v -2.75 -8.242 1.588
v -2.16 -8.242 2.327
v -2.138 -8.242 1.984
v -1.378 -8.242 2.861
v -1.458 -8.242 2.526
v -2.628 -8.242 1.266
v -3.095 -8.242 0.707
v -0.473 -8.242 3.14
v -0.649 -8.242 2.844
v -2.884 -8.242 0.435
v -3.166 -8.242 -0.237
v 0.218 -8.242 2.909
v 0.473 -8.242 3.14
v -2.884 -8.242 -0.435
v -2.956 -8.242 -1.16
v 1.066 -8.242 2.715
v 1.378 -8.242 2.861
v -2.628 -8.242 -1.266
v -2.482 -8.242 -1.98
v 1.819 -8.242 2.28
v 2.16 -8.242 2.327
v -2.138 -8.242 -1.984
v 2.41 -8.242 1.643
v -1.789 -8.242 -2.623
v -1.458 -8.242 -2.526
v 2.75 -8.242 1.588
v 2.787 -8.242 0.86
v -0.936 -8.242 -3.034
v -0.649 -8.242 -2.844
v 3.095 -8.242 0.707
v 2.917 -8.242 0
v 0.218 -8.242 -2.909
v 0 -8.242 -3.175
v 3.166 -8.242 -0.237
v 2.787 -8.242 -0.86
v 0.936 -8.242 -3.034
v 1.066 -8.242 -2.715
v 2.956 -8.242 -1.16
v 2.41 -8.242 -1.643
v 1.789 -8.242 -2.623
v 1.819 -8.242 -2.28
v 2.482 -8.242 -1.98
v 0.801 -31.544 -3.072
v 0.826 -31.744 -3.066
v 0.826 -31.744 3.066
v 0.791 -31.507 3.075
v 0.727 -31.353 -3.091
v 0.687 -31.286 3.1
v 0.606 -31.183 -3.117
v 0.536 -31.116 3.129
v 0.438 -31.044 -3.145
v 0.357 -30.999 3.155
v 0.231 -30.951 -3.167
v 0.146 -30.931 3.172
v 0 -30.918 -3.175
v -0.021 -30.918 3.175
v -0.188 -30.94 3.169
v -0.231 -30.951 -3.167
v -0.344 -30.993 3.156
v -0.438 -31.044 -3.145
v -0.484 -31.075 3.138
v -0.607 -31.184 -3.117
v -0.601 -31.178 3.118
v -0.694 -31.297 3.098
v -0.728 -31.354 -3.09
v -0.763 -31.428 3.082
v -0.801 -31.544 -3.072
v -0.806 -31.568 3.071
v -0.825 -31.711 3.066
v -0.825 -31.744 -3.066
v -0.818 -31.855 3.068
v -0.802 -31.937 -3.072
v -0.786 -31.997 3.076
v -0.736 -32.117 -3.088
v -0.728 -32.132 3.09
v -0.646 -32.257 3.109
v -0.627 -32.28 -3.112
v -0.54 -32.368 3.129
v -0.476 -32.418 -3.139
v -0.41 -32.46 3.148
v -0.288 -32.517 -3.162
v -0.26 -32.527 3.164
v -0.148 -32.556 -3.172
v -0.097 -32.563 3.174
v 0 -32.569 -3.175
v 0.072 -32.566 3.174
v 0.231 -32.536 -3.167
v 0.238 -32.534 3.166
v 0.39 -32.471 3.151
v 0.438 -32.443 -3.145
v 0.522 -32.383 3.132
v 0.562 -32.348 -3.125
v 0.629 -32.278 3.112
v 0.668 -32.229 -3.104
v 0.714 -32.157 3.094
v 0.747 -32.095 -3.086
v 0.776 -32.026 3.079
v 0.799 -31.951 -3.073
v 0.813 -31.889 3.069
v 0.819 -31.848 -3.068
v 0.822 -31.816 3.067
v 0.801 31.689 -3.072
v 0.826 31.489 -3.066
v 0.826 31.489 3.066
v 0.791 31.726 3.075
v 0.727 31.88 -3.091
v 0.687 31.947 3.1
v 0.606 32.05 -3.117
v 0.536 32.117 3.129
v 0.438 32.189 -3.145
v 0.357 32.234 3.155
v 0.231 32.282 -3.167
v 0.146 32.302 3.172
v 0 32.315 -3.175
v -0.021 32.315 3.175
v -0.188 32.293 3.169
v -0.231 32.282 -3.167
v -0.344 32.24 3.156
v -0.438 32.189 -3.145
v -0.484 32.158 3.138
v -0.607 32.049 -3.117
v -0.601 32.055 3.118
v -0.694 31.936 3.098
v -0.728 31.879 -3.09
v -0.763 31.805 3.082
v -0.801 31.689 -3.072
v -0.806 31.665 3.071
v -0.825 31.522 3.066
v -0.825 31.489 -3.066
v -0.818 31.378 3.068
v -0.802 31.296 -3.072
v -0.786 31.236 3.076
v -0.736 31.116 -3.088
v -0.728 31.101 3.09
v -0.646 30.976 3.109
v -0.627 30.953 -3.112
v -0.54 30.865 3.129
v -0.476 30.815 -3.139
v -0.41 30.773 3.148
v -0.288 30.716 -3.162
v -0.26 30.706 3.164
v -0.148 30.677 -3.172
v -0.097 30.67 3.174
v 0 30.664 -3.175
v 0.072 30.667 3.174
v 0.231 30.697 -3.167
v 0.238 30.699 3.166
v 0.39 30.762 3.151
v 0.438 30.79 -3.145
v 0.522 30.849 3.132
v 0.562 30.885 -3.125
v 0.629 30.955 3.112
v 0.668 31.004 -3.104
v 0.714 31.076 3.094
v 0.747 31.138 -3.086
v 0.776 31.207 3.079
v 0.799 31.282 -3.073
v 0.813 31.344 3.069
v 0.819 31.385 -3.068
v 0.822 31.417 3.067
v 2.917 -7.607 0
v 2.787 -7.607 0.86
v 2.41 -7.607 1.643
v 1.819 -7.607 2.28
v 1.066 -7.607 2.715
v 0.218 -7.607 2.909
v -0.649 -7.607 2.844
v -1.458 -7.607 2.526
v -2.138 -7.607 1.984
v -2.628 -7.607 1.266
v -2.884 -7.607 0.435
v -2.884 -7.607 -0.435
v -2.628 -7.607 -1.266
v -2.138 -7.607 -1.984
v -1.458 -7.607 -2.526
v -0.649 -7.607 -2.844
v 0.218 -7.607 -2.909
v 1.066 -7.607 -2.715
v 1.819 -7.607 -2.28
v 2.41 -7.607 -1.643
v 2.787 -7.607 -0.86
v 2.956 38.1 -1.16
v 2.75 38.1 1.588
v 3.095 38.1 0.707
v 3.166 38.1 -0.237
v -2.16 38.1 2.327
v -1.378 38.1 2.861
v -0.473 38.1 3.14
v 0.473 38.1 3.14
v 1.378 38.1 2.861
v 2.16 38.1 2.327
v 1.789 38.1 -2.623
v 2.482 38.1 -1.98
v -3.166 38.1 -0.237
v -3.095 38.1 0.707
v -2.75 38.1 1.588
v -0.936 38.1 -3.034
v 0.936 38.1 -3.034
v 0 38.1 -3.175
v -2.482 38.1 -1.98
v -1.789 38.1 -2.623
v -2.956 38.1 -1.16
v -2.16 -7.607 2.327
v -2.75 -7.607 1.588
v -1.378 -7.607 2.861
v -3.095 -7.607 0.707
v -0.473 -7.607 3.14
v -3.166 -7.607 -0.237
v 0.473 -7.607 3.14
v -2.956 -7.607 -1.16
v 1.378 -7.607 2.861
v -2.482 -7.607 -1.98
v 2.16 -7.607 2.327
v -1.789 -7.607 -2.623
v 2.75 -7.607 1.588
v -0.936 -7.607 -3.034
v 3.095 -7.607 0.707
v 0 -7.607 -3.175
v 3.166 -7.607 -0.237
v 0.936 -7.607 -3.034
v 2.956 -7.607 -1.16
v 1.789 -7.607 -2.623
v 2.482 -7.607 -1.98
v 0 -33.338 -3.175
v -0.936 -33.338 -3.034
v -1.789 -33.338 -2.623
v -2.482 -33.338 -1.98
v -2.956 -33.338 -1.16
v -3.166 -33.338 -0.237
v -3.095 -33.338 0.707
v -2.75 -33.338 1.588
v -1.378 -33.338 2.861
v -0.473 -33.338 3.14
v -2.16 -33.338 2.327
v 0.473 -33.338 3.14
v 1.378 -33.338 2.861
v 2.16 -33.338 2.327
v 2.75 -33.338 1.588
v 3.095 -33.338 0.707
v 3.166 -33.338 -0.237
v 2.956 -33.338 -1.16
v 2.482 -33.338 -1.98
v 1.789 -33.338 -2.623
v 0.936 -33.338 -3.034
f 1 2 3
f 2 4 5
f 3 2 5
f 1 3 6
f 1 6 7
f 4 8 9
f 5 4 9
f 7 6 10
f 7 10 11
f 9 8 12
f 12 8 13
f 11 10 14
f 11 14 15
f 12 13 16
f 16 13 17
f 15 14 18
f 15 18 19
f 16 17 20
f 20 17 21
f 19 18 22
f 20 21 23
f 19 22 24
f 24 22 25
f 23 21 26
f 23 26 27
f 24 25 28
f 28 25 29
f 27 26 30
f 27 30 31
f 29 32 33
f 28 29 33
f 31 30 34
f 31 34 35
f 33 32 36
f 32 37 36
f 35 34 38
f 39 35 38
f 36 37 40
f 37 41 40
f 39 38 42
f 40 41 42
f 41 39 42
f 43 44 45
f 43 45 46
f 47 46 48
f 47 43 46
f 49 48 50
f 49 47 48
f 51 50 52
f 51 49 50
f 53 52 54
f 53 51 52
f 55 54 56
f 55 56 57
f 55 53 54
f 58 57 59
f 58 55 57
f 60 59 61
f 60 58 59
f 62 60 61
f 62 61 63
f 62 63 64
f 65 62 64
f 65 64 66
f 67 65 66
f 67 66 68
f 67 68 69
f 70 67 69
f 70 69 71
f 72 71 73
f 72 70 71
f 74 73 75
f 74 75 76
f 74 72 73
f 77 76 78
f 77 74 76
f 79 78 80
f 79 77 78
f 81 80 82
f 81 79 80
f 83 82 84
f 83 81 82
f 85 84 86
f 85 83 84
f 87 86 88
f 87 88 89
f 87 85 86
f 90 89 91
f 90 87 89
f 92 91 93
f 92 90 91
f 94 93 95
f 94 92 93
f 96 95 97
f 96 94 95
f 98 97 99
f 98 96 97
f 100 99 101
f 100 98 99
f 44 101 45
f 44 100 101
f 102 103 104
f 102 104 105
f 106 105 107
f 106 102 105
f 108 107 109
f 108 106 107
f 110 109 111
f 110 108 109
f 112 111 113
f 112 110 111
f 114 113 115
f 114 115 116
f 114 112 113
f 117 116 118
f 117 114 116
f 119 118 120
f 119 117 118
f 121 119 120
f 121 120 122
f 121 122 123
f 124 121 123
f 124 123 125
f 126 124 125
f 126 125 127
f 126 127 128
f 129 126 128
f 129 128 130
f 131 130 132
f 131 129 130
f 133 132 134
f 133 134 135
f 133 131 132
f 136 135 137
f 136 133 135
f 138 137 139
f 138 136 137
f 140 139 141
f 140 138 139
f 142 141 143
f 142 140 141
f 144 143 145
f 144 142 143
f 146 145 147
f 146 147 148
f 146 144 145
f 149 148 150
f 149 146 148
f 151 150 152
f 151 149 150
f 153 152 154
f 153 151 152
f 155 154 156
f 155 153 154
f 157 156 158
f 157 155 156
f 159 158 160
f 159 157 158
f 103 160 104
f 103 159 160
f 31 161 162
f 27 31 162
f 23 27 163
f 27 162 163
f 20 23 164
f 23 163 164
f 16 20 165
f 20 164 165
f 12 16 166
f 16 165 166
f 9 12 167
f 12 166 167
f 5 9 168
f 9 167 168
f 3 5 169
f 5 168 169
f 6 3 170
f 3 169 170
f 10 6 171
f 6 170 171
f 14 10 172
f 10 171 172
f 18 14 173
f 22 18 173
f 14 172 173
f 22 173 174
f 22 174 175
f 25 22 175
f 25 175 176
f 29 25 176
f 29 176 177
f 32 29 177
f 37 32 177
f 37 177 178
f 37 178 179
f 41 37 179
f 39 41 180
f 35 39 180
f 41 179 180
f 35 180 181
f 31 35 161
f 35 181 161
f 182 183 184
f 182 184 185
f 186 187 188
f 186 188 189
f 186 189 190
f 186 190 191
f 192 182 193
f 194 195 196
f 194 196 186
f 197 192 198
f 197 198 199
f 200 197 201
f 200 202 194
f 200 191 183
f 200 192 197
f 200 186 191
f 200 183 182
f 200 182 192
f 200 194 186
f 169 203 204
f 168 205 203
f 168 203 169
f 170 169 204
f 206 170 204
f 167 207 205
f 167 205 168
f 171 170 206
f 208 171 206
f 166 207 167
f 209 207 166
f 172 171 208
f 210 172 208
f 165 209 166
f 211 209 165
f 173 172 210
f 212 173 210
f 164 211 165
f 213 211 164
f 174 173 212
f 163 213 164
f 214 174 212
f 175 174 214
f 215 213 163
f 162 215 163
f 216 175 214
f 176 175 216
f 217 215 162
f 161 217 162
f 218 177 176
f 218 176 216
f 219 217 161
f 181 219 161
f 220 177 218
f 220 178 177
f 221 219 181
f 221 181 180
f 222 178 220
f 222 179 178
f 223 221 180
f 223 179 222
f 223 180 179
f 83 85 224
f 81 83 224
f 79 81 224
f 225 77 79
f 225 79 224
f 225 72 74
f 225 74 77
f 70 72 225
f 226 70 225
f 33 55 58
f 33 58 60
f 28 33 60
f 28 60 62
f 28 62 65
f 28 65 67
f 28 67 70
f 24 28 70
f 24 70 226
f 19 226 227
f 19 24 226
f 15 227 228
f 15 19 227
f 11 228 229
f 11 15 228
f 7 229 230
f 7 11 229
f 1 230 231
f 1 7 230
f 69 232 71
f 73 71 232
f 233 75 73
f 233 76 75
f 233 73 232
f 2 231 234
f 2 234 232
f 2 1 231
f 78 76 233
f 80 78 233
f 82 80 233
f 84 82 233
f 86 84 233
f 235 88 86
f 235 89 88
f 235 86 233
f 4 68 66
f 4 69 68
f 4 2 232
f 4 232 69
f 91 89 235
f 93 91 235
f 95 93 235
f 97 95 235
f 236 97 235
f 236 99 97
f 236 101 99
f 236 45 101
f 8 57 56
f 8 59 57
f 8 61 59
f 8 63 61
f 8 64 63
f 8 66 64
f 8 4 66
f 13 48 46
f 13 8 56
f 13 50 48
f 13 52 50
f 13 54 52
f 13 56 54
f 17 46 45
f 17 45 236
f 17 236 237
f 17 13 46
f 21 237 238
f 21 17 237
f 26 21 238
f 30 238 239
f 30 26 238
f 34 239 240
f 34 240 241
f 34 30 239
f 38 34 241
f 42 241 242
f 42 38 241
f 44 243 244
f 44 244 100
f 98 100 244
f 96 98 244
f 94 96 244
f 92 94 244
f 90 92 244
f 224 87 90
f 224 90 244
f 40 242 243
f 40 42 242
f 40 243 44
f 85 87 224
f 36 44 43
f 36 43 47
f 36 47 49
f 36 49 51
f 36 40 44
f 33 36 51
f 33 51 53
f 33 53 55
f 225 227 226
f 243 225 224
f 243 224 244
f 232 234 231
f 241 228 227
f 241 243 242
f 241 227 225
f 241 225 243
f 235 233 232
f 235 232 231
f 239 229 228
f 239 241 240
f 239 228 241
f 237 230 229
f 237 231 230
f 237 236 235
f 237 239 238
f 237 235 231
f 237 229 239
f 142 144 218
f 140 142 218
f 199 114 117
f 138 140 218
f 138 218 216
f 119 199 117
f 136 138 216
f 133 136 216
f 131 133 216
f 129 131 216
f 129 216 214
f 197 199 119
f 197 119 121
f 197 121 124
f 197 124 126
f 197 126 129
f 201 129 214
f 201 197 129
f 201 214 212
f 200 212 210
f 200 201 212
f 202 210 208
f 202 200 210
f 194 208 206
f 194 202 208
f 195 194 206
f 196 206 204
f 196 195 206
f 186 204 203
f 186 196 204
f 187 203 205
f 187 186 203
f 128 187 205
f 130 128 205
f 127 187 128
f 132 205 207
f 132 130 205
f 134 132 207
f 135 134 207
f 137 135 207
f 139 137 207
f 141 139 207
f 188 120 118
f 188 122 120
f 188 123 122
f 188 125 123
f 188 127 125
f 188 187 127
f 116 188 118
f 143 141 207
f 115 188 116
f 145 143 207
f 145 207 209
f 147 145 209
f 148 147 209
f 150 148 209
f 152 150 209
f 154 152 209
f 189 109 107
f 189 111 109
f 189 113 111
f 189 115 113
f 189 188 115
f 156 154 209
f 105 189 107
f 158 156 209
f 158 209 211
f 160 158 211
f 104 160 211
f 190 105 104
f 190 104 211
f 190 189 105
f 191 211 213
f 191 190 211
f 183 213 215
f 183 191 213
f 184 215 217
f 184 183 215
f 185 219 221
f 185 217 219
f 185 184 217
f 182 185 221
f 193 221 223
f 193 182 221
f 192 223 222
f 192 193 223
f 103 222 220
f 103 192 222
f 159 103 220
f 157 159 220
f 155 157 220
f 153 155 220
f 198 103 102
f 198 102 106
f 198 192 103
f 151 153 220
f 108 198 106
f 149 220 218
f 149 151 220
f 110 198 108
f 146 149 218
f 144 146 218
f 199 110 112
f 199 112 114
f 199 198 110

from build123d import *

# Parameters (mm, degrees)
SKETCH1_R               = 3.175
BOSS_EXTRUDE1_DEPTH     = 38.1
SKETCH2_R               = 7.237173009
CUT_EXTRUDE1_DEPTH      = 4.7625
CUT_EXTRUDE2_DEPTH      = 39.363670966
CUT_EXTRUDE2_DEPTH_BACK = 39.363670966
SKETCH4_R               = 0.8255
SKETCH5_R               = 3.175
SKETCH5_R_2             = 2.916705682
CUT_EXTRUDE3_DEPTH      = 0.635


with BuildPart() as part:
    # Sketch1 → Boss-Extrude1 (new, symmetric)
    with BuildSketch(Plane(origin=(0, 0, 0), x_dir=(1, 0, 0), z_dir=(0, 1, 0))):
        with Locations(Location((0, 0, 0), (0, 0, 90))):
            Circle(SKETCH1_R)
    extrude(amount=BOSS_EXTRUDE1_DEPTH, both=True)

    # Sketch2 → Cut-Extrude1 (cut)
    with BuildSketch(Plane.XZ.offset(38.1)):
        with Locations((0, 0.163997739)):
            Circle(SKETCH2_R)
    extrude(amount=-CUT_EXTRUDE1_DEPTH, mode=Mode.SUBTRACT)

    # Sketch4 → Cut-Extrude2 (cut, two sides: drawn at the far end of the back side and taken through both)
    with BuildSketch(Plane.XY.offset(-CUT_EXTRUDE2_DEPTH_BACK)):
        with Locations((0, 31.489271019)):
            Circle(SKETCH4_R)
        with Locations((0, -31.74365)):
            Circle(SKETCH4_R)
    extrude(amount=CUT_EXTRUDE2_DEPTH + CUT_EXTRUDE2_DEPTH_BACK, mode=Mode.SUBTRACT)

    # Sketch5 → Cut-Extrude3 (cut)
    with BuildSketch(Plane.XZ.offset(7.6073)):
        with Locations(Location((0, 0, 0), (0, 0, 270))):
            Circle(SKETCH5_R)
        Circle(SKETCH5_R_2, mode=Mode.SUBTRACT)
    extrude(amount=CUT_EXTRUDE3_DEPTH, mode=Mode.SUBTRACT)


solid = part.part
